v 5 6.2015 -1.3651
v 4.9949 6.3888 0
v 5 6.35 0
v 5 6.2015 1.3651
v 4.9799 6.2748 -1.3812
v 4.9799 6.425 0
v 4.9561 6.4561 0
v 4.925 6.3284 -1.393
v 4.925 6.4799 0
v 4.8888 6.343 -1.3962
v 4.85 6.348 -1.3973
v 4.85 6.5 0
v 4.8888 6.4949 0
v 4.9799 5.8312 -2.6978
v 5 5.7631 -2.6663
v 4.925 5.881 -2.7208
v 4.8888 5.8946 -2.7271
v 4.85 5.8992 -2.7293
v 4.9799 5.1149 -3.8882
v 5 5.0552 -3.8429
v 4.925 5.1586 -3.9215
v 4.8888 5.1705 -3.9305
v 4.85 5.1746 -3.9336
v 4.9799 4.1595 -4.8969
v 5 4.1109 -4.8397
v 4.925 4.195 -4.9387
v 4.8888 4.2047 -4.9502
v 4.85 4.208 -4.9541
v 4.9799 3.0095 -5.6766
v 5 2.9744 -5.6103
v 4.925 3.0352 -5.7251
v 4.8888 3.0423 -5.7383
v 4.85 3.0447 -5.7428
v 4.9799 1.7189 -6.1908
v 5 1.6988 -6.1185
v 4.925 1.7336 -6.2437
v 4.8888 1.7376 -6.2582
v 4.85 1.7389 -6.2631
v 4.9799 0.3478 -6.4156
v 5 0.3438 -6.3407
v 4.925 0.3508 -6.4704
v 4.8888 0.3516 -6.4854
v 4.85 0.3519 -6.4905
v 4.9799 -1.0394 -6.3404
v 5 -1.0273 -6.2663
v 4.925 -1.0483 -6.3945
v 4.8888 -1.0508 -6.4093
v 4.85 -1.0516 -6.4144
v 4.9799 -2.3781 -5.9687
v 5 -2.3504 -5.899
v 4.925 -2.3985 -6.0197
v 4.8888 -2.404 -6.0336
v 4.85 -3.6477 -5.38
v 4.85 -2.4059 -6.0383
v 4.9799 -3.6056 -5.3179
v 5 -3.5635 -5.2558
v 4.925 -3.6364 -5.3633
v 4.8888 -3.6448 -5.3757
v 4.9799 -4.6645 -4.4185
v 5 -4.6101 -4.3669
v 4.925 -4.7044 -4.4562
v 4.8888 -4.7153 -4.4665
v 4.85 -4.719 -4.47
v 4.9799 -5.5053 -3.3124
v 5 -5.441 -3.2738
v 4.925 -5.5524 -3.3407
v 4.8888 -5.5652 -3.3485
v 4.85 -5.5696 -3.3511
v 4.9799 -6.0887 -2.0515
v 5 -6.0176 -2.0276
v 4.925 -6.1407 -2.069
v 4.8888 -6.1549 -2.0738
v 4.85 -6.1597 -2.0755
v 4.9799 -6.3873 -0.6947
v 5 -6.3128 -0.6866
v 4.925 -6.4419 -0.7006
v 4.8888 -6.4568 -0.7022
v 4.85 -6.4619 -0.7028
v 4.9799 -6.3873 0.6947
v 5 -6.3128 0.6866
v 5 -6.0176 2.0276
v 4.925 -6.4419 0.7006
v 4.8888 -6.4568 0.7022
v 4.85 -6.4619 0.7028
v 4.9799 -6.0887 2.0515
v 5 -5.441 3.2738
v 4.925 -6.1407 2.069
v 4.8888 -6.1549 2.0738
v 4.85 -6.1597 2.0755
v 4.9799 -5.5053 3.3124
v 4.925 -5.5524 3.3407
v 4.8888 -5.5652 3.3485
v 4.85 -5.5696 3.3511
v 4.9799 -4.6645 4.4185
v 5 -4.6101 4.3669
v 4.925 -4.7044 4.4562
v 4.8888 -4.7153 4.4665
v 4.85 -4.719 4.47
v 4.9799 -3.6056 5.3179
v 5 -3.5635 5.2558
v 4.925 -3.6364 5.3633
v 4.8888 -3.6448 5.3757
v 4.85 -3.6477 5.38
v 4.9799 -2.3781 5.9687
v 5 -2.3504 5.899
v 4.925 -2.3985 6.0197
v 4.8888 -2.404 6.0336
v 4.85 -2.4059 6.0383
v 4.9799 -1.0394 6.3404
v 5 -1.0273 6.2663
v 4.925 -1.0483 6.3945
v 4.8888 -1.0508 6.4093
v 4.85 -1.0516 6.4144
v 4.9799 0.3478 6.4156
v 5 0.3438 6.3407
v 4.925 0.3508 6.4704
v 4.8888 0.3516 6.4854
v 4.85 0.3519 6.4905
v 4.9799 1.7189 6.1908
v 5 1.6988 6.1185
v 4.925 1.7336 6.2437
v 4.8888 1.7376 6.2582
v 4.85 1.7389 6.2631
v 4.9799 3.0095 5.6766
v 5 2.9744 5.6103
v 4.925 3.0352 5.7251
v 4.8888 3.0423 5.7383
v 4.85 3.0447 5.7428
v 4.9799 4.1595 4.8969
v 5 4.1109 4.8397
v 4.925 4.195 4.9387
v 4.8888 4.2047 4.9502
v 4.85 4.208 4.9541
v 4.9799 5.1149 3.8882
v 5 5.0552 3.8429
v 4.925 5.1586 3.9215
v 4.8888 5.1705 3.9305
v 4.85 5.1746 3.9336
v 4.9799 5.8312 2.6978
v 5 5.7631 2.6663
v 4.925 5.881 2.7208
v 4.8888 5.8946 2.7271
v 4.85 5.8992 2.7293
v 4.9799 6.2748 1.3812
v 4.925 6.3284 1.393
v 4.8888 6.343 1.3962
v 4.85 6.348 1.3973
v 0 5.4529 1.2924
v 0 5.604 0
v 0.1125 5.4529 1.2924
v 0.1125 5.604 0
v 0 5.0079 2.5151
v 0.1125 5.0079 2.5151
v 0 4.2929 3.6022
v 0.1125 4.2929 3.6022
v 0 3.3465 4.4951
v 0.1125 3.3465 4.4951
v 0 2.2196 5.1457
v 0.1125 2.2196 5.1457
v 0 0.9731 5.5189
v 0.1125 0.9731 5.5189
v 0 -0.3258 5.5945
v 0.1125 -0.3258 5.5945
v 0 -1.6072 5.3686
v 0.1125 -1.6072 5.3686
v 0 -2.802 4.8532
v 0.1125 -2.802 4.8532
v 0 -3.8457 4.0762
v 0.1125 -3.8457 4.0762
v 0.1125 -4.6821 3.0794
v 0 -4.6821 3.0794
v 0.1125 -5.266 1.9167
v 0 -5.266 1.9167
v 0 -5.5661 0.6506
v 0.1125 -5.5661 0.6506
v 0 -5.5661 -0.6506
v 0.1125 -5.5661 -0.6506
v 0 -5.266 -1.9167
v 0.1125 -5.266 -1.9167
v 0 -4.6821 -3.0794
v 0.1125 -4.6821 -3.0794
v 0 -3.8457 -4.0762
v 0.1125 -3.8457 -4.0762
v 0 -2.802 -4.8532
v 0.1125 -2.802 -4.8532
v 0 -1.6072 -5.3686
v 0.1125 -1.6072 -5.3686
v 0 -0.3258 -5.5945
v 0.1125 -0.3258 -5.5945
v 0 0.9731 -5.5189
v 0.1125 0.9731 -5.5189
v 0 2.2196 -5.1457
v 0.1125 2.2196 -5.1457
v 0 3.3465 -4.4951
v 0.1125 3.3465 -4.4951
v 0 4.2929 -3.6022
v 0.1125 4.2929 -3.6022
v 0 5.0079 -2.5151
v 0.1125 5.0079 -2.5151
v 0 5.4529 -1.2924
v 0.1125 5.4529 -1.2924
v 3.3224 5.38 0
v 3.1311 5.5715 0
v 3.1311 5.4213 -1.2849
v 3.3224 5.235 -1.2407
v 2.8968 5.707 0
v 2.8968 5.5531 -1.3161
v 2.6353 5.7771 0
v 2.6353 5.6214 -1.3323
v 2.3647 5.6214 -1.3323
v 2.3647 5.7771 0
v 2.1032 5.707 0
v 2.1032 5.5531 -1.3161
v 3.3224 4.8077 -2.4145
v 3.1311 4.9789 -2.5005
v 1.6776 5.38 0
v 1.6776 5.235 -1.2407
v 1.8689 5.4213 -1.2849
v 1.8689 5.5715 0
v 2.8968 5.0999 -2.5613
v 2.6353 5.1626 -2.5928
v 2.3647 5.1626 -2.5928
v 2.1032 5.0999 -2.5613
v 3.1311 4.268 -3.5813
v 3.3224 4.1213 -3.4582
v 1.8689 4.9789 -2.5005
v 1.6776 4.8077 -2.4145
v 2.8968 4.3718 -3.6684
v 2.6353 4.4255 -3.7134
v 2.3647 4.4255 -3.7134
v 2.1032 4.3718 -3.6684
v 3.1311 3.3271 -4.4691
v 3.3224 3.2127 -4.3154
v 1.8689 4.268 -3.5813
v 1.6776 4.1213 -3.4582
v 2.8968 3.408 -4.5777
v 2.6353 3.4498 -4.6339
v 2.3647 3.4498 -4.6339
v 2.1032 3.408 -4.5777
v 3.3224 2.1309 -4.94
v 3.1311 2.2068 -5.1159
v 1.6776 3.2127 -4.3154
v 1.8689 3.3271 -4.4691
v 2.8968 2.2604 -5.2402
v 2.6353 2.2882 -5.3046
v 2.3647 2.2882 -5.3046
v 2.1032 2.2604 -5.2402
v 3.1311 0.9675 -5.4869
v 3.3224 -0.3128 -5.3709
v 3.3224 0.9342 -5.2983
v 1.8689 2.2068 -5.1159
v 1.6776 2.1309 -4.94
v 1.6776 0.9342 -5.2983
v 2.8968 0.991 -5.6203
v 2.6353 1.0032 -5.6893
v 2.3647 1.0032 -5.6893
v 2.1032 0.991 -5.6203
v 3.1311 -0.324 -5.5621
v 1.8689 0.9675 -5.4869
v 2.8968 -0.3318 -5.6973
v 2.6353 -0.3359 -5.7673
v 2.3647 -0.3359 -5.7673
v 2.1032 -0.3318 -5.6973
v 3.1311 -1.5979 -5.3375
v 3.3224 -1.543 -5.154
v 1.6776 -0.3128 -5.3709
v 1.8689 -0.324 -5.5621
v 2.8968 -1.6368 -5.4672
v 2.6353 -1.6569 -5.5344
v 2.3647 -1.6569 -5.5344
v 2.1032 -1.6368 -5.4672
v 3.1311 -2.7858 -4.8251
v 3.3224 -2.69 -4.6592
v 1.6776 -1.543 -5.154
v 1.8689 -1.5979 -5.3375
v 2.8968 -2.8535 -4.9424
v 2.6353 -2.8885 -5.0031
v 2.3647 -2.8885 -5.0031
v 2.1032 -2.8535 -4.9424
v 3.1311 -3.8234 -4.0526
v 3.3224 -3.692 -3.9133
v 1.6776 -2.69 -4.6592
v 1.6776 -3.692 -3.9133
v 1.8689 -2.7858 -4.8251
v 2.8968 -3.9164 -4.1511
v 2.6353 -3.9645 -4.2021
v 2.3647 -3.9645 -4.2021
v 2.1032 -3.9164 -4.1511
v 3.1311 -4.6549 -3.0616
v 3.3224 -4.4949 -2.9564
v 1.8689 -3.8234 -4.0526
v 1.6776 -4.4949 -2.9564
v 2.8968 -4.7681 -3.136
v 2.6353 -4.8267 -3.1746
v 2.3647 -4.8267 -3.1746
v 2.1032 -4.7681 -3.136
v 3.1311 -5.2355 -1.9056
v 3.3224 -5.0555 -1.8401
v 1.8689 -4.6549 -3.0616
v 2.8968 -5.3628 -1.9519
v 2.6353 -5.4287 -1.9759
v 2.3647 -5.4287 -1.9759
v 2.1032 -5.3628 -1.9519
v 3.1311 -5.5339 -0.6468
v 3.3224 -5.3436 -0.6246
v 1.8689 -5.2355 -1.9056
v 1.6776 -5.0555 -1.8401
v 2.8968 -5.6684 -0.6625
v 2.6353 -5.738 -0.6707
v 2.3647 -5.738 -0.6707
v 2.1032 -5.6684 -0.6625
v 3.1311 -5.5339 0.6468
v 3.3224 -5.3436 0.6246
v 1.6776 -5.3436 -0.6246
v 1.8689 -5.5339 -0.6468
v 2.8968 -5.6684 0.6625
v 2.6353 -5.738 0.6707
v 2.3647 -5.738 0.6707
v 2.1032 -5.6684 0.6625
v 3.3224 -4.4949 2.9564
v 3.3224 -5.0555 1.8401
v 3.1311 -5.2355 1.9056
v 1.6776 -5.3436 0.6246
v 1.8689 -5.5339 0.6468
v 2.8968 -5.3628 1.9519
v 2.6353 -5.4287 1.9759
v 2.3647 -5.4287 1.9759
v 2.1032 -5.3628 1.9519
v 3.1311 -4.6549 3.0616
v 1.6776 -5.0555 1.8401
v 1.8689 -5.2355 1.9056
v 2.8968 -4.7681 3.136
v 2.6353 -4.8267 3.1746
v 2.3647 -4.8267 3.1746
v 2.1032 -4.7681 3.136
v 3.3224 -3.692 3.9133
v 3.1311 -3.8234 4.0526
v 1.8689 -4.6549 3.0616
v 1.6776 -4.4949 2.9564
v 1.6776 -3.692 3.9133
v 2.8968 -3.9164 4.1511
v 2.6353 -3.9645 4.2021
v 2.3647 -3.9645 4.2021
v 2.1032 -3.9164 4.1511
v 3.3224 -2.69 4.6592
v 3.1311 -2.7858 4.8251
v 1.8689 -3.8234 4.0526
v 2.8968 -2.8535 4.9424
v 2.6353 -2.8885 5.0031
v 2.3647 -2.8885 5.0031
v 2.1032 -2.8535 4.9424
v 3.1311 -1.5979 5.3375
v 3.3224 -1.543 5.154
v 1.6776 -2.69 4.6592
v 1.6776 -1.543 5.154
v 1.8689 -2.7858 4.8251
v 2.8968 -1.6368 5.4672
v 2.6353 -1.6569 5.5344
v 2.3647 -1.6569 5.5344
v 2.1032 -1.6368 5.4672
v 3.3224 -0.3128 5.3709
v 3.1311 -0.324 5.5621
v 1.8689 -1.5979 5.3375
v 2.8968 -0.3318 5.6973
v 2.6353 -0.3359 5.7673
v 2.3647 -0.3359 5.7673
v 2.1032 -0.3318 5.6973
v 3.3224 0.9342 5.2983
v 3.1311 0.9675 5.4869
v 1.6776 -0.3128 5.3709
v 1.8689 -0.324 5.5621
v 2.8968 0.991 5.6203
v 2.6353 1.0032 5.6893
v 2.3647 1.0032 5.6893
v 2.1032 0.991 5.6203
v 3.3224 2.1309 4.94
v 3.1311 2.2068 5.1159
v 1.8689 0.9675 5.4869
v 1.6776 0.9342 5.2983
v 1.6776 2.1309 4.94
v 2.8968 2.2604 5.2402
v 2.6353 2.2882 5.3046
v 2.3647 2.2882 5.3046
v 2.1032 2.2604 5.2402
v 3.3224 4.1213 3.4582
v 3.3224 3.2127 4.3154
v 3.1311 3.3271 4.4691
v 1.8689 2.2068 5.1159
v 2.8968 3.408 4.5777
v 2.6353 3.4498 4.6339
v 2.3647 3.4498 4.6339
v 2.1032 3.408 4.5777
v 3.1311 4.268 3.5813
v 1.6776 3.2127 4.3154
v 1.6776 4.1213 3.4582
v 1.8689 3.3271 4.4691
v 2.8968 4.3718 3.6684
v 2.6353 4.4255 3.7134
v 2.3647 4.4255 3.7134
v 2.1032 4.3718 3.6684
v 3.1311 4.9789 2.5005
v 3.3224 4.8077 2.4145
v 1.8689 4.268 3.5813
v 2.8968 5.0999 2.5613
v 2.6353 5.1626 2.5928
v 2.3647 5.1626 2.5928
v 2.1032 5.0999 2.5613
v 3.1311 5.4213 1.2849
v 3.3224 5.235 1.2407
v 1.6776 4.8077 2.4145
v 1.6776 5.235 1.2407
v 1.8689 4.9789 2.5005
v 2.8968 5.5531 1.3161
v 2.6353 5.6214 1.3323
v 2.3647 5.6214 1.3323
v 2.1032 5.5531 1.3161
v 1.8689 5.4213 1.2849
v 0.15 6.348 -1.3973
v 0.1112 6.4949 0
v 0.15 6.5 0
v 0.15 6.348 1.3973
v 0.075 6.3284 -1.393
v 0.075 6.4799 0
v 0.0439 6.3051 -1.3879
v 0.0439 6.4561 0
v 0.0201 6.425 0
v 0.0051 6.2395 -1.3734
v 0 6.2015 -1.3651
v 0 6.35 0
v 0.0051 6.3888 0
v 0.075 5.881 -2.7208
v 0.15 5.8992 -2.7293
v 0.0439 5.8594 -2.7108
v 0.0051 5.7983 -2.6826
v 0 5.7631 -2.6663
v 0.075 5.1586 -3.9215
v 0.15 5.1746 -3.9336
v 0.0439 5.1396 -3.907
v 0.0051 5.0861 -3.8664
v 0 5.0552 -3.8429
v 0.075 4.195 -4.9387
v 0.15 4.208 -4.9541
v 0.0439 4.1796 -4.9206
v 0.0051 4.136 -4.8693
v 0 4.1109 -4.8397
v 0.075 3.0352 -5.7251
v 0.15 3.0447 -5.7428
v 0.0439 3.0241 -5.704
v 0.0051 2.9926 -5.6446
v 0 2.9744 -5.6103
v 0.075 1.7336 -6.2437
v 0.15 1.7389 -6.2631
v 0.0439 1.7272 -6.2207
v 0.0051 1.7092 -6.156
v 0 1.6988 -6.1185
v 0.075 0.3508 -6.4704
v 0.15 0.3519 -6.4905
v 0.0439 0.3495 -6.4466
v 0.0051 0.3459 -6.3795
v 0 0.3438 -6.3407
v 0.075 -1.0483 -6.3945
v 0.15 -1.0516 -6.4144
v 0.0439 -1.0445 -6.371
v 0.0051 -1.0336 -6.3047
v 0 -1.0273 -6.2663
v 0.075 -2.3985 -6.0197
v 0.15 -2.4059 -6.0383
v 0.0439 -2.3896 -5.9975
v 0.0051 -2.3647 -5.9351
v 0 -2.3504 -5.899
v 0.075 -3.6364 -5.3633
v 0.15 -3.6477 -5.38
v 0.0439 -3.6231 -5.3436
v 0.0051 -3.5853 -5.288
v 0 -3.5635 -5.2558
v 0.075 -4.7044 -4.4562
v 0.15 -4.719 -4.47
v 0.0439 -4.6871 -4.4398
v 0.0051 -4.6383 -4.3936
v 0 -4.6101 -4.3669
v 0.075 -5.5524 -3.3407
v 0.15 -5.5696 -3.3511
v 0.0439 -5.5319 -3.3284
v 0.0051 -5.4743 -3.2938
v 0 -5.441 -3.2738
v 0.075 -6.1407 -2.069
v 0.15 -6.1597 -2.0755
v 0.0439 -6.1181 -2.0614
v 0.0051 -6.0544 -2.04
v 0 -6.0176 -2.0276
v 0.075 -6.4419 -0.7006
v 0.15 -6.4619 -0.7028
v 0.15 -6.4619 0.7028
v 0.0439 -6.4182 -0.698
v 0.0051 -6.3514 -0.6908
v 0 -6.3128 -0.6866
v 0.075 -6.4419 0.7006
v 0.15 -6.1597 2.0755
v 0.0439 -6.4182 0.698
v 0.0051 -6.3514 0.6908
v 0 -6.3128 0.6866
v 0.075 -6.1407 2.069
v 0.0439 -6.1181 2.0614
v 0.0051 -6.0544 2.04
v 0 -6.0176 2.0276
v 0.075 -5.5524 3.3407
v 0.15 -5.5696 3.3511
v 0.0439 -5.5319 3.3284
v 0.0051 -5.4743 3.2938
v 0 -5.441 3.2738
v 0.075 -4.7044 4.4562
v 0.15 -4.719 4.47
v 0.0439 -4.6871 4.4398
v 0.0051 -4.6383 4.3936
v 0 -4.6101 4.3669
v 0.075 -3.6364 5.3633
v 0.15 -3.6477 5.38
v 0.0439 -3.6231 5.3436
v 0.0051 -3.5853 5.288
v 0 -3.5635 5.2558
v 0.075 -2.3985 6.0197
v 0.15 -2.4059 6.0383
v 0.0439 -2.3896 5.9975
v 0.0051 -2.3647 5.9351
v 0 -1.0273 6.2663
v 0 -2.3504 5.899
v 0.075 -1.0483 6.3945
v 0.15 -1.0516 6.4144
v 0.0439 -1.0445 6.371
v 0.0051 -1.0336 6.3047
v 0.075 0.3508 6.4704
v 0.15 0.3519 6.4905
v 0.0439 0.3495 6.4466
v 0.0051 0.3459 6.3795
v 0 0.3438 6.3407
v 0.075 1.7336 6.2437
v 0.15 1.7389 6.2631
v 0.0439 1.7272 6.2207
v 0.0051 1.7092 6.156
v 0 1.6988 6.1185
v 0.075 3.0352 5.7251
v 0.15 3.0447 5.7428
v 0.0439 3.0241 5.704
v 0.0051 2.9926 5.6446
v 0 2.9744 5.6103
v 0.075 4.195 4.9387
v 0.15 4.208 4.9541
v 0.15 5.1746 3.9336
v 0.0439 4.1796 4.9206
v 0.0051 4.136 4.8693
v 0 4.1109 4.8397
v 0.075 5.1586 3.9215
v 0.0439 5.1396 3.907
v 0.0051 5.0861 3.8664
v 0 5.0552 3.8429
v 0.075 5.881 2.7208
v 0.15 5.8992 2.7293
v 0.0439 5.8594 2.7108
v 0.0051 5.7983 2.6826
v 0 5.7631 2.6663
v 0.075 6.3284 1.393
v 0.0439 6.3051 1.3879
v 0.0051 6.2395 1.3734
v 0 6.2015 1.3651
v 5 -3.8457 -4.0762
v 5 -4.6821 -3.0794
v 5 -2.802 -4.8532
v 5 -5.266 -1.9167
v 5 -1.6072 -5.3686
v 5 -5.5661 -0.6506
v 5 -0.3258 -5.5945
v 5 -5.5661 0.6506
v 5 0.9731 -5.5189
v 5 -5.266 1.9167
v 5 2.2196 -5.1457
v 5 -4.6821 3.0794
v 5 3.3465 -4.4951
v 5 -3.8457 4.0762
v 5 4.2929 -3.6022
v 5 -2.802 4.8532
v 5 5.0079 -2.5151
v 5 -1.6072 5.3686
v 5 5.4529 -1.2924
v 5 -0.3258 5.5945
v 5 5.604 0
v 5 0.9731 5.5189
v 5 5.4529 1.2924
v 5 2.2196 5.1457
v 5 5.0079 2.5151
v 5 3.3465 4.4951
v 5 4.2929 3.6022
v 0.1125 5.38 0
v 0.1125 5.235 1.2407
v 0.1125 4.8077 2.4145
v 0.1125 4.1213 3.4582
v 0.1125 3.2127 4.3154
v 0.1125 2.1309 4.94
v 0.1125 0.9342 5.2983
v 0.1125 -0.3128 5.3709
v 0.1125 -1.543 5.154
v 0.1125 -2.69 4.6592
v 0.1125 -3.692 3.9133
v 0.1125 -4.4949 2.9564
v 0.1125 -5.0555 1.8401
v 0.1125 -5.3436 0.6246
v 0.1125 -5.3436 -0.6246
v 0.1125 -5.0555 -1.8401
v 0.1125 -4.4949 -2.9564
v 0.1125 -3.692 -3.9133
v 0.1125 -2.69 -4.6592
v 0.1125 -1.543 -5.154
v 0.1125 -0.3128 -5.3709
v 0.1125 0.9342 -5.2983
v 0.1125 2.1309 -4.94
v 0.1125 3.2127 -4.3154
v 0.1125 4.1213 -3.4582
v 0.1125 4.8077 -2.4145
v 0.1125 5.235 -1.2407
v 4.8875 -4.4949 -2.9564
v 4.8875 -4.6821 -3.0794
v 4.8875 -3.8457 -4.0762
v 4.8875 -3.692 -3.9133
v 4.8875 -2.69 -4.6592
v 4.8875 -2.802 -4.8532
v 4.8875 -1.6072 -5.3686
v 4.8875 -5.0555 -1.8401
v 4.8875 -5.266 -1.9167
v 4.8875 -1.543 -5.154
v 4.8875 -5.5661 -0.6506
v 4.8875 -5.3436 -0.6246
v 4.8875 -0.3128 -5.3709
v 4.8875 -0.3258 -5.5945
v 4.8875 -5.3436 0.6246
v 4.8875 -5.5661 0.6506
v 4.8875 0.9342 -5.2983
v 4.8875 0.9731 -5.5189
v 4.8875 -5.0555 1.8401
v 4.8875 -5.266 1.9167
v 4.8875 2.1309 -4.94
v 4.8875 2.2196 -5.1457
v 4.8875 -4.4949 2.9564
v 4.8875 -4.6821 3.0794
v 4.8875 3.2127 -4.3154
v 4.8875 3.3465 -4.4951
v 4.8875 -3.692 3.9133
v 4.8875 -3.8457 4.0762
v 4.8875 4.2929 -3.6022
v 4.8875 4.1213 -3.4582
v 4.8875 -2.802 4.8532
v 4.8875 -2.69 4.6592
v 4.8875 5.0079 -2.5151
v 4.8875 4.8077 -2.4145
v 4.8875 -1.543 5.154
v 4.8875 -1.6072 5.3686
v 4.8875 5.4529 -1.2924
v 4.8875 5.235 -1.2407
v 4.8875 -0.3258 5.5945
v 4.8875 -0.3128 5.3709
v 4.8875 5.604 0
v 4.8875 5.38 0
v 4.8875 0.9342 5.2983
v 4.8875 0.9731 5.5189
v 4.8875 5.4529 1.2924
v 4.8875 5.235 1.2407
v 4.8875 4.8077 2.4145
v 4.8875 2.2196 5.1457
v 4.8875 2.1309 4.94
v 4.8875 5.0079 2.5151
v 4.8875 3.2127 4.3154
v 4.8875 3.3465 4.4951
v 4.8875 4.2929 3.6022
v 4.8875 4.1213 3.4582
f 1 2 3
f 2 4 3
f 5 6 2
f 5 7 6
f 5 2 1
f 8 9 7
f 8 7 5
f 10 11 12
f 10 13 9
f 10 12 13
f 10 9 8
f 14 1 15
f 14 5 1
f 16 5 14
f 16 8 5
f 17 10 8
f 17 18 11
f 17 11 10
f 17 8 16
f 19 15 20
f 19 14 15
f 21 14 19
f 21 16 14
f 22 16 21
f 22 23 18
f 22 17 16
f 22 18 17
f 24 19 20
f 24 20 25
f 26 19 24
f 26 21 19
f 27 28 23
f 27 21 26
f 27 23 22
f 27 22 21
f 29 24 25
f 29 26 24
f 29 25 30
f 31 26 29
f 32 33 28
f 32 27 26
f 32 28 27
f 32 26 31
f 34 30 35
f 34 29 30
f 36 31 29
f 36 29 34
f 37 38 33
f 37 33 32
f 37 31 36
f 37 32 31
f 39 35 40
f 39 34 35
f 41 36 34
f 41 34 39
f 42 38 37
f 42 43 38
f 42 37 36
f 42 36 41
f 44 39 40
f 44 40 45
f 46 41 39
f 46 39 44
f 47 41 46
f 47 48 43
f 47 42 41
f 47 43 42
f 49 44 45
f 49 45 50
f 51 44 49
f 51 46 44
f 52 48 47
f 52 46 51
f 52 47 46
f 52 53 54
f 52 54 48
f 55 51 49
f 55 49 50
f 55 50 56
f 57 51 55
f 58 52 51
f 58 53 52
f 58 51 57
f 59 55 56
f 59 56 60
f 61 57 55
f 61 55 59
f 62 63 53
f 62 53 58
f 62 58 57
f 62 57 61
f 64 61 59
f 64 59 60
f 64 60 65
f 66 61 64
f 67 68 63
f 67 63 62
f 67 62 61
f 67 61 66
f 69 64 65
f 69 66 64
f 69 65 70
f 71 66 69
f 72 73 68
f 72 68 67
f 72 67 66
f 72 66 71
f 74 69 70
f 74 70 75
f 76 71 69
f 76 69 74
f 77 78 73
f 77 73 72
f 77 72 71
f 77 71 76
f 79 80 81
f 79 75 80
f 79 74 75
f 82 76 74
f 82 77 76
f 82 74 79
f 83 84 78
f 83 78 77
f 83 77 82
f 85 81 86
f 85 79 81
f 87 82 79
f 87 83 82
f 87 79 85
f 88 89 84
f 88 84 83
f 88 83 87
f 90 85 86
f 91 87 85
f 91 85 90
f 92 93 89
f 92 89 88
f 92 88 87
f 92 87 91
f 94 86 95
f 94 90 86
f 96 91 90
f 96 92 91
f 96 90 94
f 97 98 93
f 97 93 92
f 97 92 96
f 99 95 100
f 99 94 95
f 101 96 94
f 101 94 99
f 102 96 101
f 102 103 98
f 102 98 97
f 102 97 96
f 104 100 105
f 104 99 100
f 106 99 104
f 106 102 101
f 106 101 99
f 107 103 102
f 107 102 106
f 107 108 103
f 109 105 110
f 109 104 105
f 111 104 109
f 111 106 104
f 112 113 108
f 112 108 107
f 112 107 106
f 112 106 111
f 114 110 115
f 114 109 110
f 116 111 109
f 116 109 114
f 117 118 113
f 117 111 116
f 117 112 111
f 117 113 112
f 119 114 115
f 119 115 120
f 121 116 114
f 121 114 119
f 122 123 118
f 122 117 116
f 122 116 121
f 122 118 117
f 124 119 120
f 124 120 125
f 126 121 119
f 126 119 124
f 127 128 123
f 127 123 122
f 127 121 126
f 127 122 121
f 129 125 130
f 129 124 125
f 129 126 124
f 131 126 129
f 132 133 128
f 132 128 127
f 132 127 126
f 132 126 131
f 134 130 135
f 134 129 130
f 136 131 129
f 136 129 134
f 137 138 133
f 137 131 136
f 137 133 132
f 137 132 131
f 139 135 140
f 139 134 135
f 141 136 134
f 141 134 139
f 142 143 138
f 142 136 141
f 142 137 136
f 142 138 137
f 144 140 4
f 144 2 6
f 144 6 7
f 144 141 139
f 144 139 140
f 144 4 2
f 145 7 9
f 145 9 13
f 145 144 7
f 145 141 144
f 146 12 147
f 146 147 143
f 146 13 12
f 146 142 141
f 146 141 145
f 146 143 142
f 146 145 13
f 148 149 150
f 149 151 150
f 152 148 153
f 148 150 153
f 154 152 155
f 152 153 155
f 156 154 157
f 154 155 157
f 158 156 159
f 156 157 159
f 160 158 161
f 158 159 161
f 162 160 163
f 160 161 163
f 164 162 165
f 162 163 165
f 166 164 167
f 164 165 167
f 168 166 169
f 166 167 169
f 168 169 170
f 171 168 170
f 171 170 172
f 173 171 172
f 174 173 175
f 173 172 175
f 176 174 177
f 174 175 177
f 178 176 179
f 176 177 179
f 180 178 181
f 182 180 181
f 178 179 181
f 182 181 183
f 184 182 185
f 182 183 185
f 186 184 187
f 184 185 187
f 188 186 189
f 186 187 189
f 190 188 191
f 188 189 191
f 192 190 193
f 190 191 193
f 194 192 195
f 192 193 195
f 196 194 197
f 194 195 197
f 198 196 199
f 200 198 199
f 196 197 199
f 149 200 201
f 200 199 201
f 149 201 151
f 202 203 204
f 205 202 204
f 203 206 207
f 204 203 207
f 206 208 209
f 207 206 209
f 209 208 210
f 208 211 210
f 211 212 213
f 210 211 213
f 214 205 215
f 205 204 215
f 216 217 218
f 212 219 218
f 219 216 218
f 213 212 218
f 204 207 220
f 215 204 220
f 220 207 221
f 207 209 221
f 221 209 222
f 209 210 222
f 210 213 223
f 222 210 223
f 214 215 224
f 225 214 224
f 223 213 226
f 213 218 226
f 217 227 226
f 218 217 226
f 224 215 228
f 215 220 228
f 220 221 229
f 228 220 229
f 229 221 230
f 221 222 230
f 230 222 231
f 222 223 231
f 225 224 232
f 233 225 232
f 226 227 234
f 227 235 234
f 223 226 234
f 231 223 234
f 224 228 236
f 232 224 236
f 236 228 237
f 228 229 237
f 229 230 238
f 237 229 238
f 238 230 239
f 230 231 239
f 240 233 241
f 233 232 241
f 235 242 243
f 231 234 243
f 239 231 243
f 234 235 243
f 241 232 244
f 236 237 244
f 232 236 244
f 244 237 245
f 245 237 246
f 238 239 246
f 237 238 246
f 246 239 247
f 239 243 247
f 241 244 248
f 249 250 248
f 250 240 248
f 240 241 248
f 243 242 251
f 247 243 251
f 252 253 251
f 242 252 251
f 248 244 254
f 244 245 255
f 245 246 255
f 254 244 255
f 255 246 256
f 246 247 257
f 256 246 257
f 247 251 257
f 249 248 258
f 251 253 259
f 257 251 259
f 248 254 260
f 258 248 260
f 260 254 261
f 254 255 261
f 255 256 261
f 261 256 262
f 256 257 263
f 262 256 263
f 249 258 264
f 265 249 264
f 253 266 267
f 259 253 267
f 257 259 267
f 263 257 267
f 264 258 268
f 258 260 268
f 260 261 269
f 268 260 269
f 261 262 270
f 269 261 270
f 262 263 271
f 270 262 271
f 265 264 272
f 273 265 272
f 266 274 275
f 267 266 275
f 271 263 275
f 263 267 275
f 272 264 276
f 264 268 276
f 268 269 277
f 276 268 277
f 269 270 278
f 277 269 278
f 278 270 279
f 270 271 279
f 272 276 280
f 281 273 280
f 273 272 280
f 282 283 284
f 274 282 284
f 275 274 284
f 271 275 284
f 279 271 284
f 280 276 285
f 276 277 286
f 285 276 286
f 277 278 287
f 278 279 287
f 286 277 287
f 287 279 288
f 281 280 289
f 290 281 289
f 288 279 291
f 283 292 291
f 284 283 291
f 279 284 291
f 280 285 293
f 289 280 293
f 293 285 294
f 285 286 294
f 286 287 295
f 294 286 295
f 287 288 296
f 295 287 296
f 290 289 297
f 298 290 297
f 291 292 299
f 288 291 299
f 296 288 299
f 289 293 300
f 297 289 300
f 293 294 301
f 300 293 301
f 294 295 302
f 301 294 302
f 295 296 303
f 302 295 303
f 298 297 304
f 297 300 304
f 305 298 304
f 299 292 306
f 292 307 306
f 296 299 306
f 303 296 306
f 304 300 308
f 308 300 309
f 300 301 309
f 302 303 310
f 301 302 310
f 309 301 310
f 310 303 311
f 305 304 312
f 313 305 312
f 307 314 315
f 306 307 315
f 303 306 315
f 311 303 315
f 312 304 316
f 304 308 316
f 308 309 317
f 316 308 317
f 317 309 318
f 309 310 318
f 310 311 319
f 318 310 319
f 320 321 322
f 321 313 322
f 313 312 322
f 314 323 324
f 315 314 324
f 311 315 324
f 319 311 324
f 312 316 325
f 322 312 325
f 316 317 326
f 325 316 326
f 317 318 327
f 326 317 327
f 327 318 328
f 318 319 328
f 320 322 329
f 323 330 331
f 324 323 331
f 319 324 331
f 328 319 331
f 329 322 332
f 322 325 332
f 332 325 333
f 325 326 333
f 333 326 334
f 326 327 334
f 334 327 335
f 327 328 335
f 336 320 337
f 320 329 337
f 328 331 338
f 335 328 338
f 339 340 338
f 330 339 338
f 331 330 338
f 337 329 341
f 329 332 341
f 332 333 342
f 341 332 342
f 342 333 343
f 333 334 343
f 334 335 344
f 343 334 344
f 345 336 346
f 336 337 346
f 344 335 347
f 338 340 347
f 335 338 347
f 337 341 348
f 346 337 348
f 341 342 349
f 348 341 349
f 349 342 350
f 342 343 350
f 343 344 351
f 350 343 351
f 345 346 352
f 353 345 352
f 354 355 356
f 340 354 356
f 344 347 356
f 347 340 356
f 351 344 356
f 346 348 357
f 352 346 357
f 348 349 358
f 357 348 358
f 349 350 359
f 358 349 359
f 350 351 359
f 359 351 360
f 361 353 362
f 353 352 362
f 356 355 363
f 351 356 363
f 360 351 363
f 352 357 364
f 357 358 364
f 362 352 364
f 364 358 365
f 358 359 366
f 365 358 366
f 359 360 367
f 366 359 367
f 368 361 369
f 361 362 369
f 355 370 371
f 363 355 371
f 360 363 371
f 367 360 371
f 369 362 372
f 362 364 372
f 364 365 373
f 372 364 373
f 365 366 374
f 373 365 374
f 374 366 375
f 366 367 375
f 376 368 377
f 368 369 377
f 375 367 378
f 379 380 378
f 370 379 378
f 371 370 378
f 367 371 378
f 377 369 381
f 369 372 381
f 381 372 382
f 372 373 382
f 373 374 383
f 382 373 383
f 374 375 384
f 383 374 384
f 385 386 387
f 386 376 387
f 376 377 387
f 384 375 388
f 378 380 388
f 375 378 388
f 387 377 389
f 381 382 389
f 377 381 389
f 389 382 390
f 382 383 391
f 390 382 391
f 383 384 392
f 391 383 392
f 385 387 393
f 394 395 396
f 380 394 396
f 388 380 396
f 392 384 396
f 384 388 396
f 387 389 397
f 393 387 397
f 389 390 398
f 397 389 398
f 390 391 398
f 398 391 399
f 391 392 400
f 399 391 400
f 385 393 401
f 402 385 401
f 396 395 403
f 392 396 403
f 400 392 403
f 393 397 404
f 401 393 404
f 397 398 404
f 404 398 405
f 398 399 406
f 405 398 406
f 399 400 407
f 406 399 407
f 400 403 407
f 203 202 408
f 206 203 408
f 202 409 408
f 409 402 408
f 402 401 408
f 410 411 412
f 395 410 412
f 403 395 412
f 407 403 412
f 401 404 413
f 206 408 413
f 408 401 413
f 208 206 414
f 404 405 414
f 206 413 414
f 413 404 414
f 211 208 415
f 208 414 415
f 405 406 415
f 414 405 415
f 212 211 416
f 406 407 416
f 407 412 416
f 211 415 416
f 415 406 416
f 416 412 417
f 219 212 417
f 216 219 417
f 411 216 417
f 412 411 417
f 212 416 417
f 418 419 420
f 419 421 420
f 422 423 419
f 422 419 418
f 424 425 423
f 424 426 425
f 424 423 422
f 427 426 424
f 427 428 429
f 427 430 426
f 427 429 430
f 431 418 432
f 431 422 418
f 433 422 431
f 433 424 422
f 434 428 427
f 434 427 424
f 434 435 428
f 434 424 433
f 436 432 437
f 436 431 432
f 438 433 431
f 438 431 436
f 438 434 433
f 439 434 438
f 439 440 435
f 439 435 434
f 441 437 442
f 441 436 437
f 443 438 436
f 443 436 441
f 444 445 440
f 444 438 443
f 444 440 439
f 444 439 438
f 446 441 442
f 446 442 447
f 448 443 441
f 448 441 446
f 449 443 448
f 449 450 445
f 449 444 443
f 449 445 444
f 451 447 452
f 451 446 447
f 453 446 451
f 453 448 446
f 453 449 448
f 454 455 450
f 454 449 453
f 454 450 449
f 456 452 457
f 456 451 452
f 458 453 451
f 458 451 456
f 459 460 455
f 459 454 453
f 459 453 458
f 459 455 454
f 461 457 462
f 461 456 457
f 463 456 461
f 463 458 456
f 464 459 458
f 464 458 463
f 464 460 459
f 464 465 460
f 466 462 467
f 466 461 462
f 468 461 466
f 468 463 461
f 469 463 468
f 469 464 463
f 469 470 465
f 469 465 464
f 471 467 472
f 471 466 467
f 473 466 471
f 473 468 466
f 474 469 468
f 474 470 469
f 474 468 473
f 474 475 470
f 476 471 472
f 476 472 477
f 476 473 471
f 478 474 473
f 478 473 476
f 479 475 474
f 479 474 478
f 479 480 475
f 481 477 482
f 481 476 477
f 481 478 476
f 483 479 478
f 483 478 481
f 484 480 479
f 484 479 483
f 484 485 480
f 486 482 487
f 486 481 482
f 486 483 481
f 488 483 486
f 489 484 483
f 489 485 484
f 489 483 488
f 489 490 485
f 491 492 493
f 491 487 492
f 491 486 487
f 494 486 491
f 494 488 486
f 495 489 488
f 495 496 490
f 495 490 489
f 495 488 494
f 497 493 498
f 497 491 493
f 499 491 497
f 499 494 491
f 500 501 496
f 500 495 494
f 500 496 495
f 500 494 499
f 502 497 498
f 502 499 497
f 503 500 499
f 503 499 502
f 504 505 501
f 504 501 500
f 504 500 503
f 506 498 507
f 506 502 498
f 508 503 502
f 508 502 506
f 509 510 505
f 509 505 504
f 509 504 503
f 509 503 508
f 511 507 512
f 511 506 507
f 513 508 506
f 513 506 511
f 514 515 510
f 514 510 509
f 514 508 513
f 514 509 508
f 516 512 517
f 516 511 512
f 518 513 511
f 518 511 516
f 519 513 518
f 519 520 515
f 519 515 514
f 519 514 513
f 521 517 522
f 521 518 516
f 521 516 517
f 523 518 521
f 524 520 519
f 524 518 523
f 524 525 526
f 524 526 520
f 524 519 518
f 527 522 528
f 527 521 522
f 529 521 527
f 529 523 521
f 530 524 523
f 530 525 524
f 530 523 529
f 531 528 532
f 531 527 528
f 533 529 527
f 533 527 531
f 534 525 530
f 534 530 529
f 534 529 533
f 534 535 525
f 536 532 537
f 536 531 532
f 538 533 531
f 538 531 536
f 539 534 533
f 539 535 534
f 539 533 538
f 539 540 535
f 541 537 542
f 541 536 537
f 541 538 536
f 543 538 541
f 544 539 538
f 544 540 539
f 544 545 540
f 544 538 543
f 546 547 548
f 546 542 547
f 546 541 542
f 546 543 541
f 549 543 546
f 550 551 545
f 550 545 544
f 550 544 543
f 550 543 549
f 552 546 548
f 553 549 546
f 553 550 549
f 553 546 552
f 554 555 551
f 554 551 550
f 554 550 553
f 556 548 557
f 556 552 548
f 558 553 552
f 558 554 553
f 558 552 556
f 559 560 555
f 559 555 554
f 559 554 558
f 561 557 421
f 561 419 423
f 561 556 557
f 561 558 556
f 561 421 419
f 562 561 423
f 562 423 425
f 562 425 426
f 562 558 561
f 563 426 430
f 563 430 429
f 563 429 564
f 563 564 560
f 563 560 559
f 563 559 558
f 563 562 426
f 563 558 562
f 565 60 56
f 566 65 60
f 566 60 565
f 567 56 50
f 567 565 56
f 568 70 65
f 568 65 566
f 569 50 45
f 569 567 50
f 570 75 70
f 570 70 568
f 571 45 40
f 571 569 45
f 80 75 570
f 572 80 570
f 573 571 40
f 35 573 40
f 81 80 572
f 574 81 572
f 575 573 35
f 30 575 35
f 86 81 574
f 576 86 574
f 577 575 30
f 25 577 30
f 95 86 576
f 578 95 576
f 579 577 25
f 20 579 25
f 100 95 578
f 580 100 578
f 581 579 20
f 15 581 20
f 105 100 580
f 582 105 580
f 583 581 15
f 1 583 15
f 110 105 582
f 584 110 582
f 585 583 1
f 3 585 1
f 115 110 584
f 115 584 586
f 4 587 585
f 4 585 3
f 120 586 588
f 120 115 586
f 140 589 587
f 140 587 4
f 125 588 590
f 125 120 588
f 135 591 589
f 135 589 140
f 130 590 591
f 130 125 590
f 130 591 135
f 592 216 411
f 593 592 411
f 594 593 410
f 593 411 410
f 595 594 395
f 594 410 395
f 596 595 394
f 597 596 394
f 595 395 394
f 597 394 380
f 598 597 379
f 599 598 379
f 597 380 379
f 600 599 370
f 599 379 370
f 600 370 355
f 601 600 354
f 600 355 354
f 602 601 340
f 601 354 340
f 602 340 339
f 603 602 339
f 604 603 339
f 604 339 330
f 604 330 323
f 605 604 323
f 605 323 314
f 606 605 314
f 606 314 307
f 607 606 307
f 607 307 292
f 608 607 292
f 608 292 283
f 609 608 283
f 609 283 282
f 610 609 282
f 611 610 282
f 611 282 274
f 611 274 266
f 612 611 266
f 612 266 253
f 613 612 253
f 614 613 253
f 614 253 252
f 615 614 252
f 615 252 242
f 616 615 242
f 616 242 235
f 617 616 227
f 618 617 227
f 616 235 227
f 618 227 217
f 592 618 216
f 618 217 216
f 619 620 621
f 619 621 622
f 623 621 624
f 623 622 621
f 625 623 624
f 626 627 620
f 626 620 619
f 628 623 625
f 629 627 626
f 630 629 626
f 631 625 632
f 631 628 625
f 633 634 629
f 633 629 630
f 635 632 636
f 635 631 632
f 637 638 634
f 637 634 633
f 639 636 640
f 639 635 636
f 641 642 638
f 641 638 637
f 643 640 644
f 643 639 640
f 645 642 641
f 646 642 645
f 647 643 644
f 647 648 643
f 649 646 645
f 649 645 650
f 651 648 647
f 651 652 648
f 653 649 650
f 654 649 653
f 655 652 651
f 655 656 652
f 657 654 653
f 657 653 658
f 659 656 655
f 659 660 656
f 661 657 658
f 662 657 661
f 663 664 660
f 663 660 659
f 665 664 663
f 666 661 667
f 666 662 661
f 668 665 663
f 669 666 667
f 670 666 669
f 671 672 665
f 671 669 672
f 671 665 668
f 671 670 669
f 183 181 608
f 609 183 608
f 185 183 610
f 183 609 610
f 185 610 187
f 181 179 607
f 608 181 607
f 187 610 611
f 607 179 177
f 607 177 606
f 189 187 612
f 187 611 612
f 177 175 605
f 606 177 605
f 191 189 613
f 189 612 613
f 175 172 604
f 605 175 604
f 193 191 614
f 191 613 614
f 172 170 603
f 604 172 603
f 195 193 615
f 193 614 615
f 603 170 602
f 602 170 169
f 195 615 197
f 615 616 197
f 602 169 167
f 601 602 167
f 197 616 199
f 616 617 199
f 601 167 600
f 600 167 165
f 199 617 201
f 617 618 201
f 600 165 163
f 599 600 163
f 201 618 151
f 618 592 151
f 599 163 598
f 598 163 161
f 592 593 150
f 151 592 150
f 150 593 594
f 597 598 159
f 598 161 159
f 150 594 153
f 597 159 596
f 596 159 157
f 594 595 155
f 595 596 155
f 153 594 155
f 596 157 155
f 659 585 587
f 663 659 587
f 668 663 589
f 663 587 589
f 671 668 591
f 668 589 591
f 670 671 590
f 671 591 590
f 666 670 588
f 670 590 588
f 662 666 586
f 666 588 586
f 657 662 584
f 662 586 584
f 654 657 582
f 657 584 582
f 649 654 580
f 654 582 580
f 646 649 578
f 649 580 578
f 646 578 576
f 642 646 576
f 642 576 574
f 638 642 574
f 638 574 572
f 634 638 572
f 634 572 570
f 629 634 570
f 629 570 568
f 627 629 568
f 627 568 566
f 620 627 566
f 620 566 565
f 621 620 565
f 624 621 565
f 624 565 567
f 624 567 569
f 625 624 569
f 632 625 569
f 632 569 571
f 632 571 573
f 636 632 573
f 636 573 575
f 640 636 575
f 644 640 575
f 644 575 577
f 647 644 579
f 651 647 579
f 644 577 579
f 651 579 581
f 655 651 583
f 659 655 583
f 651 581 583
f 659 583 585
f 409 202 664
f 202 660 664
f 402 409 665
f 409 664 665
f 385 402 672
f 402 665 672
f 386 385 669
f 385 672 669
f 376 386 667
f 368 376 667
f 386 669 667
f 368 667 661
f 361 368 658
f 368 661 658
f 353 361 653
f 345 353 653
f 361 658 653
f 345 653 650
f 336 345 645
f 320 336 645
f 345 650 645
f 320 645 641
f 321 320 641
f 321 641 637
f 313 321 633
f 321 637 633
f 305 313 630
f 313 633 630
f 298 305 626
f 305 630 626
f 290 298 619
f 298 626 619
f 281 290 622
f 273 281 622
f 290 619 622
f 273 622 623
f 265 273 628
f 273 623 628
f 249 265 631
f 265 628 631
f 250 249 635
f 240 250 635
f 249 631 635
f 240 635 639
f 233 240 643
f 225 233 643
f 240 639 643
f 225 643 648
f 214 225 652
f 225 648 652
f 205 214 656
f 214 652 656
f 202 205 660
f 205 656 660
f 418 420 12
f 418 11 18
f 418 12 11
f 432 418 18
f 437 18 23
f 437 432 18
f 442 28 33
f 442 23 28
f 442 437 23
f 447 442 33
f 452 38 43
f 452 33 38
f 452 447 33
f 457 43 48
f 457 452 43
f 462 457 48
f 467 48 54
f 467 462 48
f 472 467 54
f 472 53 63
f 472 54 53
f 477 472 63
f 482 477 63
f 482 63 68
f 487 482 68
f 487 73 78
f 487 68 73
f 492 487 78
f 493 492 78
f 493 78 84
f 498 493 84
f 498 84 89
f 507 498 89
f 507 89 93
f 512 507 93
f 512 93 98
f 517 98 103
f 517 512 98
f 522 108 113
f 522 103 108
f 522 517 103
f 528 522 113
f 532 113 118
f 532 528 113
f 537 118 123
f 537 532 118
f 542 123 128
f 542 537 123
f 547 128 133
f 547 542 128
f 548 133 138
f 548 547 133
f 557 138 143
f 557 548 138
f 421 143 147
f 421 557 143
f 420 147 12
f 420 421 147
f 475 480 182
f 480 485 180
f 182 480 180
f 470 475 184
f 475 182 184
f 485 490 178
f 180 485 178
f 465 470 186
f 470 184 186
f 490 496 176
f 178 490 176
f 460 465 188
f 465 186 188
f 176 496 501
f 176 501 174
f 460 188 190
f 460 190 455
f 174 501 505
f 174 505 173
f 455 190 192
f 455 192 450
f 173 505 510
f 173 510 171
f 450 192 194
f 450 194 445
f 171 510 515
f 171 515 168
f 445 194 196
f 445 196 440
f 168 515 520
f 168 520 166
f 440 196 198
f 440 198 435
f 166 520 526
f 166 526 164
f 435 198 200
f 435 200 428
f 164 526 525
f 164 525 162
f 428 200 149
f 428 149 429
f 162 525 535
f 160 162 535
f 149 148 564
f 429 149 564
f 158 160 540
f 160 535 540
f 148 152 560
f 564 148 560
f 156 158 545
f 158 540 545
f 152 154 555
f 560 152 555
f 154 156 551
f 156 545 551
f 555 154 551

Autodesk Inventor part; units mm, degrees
sketch "Sketch_3" plane through (0, 0, 0) normal (0, 0, 1) x (1, 0, 0)
  line L0 (5, 0) -> (0, 0)
  line L1 (0, 5.604) -> (0.1125, 5.604)
  line L2 (0.1125, 5.604) -> (0.1125, 5.38)
  line L3 (0.1125, 5.38) -> (1.6776, 5.38)
  arc A0 (3.3224, 5.38) -> (1.6776, 5.38) centre (2.5, 4.75) ccw
  line L4 (3.3224, 5.38) -> (4.8875, 5.38)
  line L5 (4.8875, 5.38) -> (4.8875, 5.604)
  line L6 (4.8875, 5.604) -> (5, 5.604)
  line L7 (5, 5.604) -> (5, 6.35)
  arc A1 (5, 6.35) -> (4.85, 6.5) centre (4.85, 6.35) ccw
  line L8 (4.85, 6.5) -> (0.15, 6.5)
  arc A2 (0.15, 6.5) -> (0, 6.35) centre (0.15, 6.35) ccw
  line L9 (0, 6.35) -> (0, 5.604)
revolve "Revolution1" add sketch "Sketch_3" angle 360 about axis through (5, 0, 0) along (1, 0, 0)
ref_plane "mss_or_XY" through (0, 0, 0) normal (1, 0, 0) x (0, 0, -1)
ref_plane "mss_or_YZ" through (0, 0, 0) normal (0, 0, -1) x (0, 1, 0)
ref_plane "mss_or_ZX" through (0, 0, 0) normal (0, 1, 0) x (1, 0, 0)
ref_plane "mss_or11_XY" through (5, 0, 0) normal (1, 0, 0) x (0, 0, -1)
ref_plane "mss_or11_YZ" through (5, 0, 0) normal (0, 0, -1) x (0, 1, 0)
ref_plane "mss_or11_ZX" through (5, 0, 0) normal (0, 1, 0) x (1, 0, 0)
ref_plane "mss_or2_1_XY" through (1.75, 4.75, 0) normal (1, 0, 0) x (0, 0, -1)
ref_plane "mss_or2_1_YZ" through (1.75, 4.75, 0) normal (0, 0, -1) x (0, 1, 0)
ref_plane "mss_or2_1_ZX" through (1.75, 4.75, 0) normal (0, 1, 0) x (1, 0, 0)
ref_plane "mss_or2_2_XY" through (1.75, 3.3588, 3.3588) normal (1, 0, 0) x (0, 0, -1)
ref_plane "mss_or2_2_YZ" through (1.75, 3.3588, 3.3588) normal (0, 0, -1) x (0, 1, 0)
ref_plane "mss_or2_2_ZX" through (1.75, 3.3588, 3.3588) normal (0, 1, 0) x (1, 0, 0)
ref_plane "mss_or2_3_XY" through (1.75, 0, 4.75) normal (1, 0, 0) x (0, 0, -1)
ref_plane "mss_or2_3_YZ" through (1.75, 0, 4.75) normal (0, 0, -1) x (0, 1, 0)
ref_plane "mss_or2_3_ZX" through (1.75, 0, 4.75) normal (0, 1, 0) x (1, 0, 0)
ref_plane "mss_or2_4_XY" through (1.75, -3.3588, 3.3588) normal (1, 0, 0) x (0, 0, -1)
ref_plane "mss_or2_4_YZ" through (1.75, -3.3588, 3.3588) normal (0, 0, -1) x (0, 1, 0)
ref_plane "mss_or2_4_ZX" through (1.75, -3.3588, 3.3588) normal (0, 1, 0) x (1, 0, 0)
ref_plane "mss_or2_5_XY" through (1.75, -4.75, 0) normal (1, 0, 0) x (0, 0, -1)
ref_plane "mss_or2_5_YZ" through (1.75, -4.75, 0) normal (0, 0, -1) x (0, 1, 0)
ref_plane "mss_or2_5_ZX" through (1.75, -4.75, 0) normal (0, 1, 0) x (1, 0, 0)
ref_plane "mss_or2_6_XY" through (1.75, -3.3588, -3.3588) normal (1, 0, 0) x (0, 0, -1)
ref_plane "mss_or2_6_YZ" through (1.75, -3.3588, -3.3588) normal (0, 0, -1) x (0, 1, 0)
ref_plane "mss_or2_6_ZX" through (1.75, -3.3588, -3.3588) normal (0, 1, 0) x (1, 0, 0)
ref_plane "mss_or2_7_XY" through (1.75, 0, -4.75) normal (1, 0, 0) x (0, 0, -1)
ref_plane "mss_or2_7_YZ" through (1.75, 0, -4.75) normal (0, 0, -1) x (0, 1, 0)
ref_plane "mss_or2_7_ZX" through (1.75, 0, -4.75) normal (0, 1, 0) x (1, 0, 0)
ref_plane "mss_or2_8_XY" through (1.75, 3.3588, -3.3588) normal (1, 0, 0) x (0, 0, -1)
ref_plane "mss_or2_8_YZ" through (1.75, 3.3588, -3.3588) normal (0, 0, -1) x (0, 1, 0)
ref_plane "mss_or2_8_ZX" through (1.75, 3.3588, -3.3588) normal (0, 1, 0) x (1, 0, 0)
ref_plane "mss_or21_1_XY" through (2.5, 4.75, 0) normal (1, 0, 0) x (0, 0, -1)
ref_plane "mss_or21_1_YZ" through (2.5, 4.75, 0) normal (0, 0, -1) x (0, 1, 0)
ref_plane "mss_or21_1_ZX" through (2.5, 4.75, 0) normal (0, 1, 0) x (1, 0, 0)
ref_plane "mss_or21_2_XY" through (2.5, 3.3588, 3.3588) normal (1, 0, 0) x (0, 0, -1)
ref_plane "mss_or21_2_YZ" through (2.5, 3.3588, 3.3588) normal (0, 0, -1) x (0, 1, 0)
ref_plane "mss_or21_2_ZX" through (2.5, 3.3588, 3.3588) normal (0, 1, 0) x (1, 0, 0)
ref_plane "mss_or21_3_XY" through (2.5, 0, 4.75) normal (1, 0, 0) x (0, 0, -1)
ref_plane "mss_or21_3_YZ" through (2.5, 0, 4.75) normal (0, 0, -1) x (0, 1, 0)
ref_plane "mss_or21_3_ZX" through (2.5, 0, 4.75) normal (0, 1, 0) x (1, 0, 0)
ref_plane "mss_or21_4_XY" through (2.5, -3.3588, 3.3588) normal (1, 0, 0) x (0, 0, -1)
ref_plane "mss_or21_4_YZ" through (2.5, -3.3588, 3.3588) normal (0, 0, -1) x (0, 1, 0)
ref_plane "mss_or21_4_ZX" through (2.5, -3.3588, 3.3588) normal (0, 1, 0) x (1, 0, 0)
ref_plane "mss_or21_5_XY" through (2.5, -4.75, 0) normal (1, 0, 0) x (0, 0, -1)
ref_plane "mss_or21_5_YZ" through (2.5, -4.75, 0) normal (0, 0, -1) x (0, 1, 0)
ref_plane "mss_or21_5_ZX" through (2.5, -4.75, 0) normal (0, 1, 0) x (1, 0, 0)
ref_plane "mss_or21_6_XY" through (2.5, -3.3588, -3.3588) normal (1, 0, 0) x (0, 0, -1)
ref_plane "mss_or21_6_YZ" through (2.5, -3.3588, -3.3588) normal (0, 0, -1) x (0, 1, 0)
ref_plane "mss_or21_6_ZX" through (2.5, -3.3588, -3.3588) normal (0, 1, 0) x (1, 0, 0)
ref_plane "mss_or21_7_XY" through (2.5, 0, -4.75) normal (1, 0, 0) x (0, 0, -1)
ref_plane "mss_or21_7_YZ" through (2.5, 0, -4.75) normal (0, 0, -1) x (0, 1, 0)
ref_plane "mss_or21_7_ZX" through (2.5, 0, -4.75) normal (0, 1, 0) x (1, 0, 0)
ref_plane "mss_or21_8_XY" through (2.5, 3.3588, -3.3588) normal (1, 0, 0) x (0, 0, -1)
ref_plane "mss_or21_8_YZ" through (2.5, 3.3588, -3.3588) normal (0, 0, -1) x (0, 1, 0)
ref_plane "mss_or21_8_ZX" through (2.5, 3.3588, -3.3588) normal (0, 1, 0) x (1, 0, 0)
properties part number "W686ZZ Outer ring"
